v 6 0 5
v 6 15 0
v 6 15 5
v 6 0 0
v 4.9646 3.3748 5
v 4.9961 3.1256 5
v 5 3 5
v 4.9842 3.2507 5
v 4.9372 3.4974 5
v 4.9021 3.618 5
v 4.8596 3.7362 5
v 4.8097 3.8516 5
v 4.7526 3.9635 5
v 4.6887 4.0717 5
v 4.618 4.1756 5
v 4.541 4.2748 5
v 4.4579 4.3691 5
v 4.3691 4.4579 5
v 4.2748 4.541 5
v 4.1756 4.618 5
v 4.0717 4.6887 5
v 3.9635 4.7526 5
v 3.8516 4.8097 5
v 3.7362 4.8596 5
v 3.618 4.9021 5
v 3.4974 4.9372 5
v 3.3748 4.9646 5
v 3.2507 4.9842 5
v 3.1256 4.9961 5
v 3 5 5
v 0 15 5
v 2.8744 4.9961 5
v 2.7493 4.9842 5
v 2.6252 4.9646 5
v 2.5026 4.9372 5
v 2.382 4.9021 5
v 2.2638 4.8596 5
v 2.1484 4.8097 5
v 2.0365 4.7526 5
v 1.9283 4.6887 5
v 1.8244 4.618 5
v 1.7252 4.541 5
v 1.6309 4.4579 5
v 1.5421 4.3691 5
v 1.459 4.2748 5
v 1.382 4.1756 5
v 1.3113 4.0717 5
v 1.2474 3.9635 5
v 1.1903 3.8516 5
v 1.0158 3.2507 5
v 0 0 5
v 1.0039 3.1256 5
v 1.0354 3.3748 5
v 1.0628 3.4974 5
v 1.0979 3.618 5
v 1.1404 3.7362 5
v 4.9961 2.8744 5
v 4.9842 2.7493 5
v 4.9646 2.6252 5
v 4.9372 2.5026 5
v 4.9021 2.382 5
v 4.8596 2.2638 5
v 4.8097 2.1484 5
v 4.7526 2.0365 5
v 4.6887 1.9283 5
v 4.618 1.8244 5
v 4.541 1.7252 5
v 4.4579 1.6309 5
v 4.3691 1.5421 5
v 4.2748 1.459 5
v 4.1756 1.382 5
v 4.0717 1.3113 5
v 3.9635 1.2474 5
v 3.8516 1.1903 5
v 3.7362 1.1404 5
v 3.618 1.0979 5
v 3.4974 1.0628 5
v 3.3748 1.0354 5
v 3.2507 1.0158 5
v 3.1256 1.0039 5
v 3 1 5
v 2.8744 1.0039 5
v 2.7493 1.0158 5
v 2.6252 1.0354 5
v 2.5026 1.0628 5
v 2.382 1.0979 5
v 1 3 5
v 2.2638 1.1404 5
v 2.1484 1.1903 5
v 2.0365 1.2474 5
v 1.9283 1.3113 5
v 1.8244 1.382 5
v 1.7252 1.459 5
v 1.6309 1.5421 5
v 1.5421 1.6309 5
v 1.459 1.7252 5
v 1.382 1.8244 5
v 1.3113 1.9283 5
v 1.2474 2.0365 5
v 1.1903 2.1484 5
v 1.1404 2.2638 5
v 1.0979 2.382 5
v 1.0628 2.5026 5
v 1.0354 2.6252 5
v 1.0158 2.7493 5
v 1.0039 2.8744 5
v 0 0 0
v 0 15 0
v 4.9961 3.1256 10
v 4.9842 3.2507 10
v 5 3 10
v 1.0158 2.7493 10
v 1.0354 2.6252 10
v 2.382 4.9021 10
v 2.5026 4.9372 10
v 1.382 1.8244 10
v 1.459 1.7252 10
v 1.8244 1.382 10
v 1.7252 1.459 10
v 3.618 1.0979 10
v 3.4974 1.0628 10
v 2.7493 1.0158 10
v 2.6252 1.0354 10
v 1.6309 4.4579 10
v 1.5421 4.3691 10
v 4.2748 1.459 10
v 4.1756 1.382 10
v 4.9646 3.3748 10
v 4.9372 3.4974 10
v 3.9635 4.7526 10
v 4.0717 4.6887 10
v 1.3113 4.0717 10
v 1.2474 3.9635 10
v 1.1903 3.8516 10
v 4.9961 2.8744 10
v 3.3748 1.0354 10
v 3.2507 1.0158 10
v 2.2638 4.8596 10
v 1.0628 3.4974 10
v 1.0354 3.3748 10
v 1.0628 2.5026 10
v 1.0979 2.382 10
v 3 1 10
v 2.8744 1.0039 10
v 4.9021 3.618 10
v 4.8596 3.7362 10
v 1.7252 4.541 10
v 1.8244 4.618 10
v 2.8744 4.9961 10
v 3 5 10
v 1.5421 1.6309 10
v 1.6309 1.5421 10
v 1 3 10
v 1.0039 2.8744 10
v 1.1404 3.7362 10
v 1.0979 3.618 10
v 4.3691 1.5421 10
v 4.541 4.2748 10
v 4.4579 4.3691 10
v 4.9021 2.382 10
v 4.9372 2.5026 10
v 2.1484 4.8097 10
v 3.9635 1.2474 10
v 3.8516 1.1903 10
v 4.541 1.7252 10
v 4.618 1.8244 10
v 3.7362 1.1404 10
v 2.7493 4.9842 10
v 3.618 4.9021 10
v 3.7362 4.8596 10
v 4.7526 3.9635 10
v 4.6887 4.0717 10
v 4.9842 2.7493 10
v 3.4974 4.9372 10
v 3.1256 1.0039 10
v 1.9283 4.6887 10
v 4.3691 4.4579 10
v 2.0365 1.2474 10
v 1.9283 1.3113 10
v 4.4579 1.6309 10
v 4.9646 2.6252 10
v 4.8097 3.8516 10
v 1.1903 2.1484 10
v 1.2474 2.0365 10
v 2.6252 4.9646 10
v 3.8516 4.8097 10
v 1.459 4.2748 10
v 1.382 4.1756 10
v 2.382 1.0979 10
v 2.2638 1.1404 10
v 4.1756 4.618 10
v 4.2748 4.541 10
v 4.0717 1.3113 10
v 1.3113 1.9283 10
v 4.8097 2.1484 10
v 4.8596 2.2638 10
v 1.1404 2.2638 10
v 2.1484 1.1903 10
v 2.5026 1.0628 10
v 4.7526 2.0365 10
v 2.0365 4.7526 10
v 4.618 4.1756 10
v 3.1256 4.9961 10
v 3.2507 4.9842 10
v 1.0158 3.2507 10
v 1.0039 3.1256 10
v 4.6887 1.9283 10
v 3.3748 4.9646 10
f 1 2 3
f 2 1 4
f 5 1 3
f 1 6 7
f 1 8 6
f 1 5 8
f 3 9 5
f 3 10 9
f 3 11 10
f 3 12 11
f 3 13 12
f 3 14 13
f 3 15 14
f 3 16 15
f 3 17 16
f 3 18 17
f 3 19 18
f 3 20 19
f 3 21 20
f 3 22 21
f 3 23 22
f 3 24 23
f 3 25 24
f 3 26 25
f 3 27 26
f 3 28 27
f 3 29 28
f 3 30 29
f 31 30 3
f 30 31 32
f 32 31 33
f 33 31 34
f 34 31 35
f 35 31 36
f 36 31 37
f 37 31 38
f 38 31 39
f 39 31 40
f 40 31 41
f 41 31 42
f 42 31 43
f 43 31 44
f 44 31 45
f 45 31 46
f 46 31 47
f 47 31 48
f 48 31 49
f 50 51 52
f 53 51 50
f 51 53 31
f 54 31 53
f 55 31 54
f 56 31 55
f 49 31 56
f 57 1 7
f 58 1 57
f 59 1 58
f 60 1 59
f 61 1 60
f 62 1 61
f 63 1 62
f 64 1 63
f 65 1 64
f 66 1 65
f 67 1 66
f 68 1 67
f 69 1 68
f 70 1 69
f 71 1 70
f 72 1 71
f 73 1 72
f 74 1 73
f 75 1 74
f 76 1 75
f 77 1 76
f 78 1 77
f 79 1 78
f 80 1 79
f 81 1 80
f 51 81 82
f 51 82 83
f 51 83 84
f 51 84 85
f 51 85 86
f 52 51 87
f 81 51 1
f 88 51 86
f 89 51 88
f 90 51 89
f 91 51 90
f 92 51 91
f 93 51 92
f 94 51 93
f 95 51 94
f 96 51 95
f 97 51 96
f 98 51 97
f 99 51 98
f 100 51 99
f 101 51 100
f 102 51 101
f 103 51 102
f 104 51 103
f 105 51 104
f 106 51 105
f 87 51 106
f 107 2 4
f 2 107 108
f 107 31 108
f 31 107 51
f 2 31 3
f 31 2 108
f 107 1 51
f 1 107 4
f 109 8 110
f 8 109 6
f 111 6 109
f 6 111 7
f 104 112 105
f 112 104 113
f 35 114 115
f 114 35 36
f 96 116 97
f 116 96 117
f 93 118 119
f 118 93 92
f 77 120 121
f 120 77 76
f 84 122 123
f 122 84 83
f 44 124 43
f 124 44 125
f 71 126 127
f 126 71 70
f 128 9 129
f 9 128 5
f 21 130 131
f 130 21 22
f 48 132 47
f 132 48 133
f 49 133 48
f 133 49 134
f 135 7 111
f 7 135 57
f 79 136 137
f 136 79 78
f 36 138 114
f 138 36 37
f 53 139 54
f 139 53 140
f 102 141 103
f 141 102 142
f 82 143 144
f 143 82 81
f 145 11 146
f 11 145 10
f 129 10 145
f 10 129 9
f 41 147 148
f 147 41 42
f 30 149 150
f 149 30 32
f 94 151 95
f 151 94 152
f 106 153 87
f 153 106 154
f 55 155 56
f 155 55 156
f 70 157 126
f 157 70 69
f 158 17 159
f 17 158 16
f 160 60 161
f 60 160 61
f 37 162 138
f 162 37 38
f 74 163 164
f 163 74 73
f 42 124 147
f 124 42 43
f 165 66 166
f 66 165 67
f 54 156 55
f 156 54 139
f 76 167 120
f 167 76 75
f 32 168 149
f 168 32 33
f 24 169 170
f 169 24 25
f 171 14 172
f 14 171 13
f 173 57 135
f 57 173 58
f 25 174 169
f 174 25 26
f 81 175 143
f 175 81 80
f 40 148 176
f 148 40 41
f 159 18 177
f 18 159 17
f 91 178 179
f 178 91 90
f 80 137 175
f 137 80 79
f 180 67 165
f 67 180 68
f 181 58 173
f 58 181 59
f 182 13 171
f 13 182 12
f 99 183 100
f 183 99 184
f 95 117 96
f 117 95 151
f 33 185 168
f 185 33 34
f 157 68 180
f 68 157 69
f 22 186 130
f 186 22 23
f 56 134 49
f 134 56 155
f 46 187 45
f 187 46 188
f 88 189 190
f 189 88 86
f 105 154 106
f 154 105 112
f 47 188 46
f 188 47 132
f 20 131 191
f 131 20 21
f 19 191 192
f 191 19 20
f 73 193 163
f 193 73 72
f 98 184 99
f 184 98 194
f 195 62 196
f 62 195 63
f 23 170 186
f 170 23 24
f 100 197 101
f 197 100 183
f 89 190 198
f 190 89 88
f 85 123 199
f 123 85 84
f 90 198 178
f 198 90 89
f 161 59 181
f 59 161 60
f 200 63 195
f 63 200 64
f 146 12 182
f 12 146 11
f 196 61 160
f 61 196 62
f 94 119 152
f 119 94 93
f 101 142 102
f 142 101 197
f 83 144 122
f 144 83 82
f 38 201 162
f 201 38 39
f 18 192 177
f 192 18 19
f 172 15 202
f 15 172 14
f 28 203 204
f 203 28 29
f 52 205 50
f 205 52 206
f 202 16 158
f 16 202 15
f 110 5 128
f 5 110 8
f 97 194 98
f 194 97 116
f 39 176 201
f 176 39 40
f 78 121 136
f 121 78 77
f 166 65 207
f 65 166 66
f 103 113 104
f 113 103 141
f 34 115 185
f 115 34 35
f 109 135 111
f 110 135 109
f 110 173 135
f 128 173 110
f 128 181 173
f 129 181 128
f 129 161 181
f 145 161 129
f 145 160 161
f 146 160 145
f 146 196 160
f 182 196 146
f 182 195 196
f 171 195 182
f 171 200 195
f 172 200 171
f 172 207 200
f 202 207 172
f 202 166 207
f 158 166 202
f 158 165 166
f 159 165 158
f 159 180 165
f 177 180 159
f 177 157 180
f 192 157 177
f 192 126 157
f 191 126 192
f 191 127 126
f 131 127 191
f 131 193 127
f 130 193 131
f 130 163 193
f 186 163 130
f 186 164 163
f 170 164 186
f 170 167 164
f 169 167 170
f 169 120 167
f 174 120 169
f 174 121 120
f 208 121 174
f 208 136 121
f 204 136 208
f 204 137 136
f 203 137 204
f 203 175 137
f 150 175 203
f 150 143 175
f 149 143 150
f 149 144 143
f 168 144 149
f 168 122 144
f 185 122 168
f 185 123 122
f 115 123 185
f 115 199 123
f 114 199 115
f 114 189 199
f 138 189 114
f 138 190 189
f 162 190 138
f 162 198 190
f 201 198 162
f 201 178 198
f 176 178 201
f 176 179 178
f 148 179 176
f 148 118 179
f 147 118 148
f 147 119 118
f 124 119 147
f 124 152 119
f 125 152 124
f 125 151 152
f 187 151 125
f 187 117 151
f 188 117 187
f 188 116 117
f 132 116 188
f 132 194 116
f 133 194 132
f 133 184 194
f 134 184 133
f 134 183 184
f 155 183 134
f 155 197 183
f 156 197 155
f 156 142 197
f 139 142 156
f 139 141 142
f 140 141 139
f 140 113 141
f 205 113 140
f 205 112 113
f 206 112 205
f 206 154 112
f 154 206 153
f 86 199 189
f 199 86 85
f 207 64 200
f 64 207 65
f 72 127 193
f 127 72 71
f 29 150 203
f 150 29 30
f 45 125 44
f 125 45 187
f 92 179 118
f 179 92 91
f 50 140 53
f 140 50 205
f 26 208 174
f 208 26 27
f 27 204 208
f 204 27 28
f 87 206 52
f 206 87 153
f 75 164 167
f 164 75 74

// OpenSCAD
difference(){
	union(){


        translate([0,0,0]){
           cube([6,15,5], center=false);
        }        


        translate([3,3,0]){
            rotate([0,0,0]){
               cylinder(h=10, r=2, $fn=100, center=false);
            }
        }

        
	}
	union() {


	}
}
